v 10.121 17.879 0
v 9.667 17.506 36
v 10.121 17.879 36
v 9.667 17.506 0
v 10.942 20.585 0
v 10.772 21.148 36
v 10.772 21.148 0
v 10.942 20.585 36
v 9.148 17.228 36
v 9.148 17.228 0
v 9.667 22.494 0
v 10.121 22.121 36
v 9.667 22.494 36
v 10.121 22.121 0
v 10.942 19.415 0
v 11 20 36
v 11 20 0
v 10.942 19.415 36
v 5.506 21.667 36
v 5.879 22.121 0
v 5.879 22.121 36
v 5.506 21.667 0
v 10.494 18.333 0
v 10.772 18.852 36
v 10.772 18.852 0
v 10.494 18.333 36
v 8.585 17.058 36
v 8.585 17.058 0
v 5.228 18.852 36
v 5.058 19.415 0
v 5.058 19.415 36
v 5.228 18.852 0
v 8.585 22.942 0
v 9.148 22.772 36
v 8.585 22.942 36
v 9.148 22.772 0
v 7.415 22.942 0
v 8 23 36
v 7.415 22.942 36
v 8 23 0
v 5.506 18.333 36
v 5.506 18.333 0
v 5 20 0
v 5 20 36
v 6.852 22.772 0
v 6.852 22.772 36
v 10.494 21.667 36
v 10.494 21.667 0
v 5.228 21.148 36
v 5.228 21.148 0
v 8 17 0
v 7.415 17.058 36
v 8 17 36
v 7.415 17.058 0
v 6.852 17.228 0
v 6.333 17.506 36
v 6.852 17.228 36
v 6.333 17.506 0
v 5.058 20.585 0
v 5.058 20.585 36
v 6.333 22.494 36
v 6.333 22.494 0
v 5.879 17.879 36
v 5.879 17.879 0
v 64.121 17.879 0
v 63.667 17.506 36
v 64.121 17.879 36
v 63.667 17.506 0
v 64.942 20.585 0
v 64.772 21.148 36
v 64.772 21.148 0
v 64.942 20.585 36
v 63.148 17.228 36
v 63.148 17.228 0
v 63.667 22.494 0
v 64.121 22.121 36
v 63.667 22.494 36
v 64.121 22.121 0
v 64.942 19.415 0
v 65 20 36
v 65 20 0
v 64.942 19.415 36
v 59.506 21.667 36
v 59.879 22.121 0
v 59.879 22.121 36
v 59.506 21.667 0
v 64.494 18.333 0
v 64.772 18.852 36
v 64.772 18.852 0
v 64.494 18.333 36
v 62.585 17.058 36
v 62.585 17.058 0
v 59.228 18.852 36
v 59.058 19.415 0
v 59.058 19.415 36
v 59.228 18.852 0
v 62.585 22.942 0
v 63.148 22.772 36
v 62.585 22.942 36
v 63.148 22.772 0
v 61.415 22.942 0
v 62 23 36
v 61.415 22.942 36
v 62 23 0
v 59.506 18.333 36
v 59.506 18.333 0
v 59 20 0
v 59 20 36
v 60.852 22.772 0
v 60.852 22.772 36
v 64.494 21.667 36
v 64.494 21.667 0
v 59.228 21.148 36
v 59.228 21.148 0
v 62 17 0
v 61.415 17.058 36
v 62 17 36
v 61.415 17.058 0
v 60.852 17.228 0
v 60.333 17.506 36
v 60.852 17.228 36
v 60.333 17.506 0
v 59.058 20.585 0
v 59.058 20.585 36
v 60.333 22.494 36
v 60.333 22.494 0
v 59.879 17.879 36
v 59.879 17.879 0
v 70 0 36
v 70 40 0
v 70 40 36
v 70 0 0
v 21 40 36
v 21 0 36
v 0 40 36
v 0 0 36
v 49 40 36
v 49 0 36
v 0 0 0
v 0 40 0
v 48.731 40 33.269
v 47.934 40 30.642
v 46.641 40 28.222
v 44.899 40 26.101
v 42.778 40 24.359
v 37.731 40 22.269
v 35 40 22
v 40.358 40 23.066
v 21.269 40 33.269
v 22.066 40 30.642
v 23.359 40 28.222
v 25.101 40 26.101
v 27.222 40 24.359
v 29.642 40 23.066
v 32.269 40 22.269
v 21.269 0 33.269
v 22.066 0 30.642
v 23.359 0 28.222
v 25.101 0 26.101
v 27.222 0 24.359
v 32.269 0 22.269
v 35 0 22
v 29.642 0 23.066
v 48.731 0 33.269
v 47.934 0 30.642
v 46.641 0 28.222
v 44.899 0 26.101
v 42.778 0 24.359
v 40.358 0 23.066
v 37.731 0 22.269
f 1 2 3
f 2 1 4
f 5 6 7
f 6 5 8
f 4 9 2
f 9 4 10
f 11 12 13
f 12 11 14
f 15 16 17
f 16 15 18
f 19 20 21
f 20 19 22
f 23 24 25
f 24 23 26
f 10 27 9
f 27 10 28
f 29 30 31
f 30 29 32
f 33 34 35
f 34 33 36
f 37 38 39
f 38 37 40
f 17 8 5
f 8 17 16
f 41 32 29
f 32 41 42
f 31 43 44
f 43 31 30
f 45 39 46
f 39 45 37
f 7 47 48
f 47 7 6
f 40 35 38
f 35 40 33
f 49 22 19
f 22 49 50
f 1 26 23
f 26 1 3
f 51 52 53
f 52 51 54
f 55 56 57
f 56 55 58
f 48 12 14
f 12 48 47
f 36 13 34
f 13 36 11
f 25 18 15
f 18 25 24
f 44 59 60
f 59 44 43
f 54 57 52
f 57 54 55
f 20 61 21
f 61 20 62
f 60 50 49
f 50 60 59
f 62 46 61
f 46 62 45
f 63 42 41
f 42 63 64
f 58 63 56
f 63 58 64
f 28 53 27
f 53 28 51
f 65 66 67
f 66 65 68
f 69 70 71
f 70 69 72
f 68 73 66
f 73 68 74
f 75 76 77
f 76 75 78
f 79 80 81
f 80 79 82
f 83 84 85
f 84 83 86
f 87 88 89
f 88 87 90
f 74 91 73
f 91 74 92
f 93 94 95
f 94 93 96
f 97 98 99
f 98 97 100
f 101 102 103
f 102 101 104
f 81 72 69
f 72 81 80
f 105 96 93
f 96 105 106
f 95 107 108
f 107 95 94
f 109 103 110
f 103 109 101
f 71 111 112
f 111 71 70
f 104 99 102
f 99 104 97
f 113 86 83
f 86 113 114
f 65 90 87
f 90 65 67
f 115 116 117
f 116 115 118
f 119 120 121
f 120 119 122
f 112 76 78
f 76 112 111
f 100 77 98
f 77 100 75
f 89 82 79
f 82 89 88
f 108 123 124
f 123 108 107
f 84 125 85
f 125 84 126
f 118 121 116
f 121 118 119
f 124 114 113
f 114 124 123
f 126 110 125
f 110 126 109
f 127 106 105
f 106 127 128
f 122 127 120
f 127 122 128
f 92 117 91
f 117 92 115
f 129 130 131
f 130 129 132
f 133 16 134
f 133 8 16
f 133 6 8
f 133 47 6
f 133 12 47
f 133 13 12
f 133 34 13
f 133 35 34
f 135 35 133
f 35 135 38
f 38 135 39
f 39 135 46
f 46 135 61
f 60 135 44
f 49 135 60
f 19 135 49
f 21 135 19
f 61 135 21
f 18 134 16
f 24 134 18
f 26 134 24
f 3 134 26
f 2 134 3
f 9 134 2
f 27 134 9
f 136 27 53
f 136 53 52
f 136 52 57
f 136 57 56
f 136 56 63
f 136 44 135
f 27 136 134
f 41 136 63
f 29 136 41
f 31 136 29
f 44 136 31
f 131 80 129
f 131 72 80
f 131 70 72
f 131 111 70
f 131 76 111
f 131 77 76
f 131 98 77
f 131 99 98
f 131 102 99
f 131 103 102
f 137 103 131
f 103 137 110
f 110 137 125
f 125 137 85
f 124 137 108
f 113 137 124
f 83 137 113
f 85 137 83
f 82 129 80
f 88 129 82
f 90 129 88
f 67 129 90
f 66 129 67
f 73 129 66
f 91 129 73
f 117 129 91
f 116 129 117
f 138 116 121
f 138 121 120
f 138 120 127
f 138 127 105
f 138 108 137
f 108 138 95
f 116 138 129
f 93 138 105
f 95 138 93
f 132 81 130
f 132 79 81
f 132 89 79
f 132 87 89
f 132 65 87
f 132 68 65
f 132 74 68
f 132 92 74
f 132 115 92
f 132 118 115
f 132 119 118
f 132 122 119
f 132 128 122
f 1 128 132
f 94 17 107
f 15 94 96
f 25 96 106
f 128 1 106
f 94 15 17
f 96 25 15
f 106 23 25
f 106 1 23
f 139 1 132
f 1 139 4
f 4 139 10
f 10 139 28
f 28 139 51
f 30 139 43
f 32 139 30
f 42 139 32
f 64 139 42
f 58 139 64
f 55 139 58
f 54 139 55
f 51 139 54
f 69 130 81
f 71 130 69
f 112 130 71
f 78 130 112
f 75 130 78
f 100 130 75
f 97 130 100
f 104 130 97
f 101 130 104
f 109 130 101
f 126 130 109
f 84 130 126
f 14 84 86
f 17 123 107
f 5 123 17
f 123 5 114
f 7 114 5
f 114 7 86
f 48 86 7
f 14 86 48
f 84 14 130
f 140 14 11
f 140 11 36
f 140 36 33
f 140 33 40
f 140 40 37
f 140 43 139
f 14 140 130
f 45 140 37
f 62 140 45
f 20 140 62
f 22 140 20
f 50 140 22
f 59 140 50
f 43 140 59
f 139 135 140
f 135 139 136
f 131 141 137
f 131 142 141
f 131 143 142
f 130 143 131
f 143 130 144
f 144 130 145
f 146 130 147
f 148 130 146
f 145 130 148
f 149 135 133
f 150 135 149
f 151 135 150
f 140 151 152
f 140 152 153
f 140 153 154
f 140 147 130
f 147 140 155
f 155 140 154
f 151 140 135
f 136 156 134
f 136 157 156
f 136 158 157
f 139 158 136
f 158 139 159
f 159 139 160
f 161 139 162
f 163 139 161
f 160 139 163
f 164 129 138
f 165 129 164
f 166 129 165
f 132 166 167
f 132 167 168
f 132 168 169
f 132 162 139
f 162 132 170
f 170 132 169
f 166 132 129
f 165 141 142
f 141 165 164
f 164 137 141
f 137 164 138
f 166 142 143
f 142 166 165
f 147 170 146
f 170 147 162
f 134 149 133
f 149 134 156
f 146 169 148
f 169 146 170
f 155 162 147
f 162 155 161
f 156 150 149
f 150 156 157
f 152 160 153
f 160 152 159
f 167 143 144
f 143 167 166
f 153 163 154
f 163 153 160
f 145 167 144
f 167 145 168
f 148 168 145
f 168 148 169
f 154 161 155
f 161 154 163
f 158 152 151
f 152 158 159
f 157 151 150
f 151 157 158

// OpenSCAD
$fn = 32;

// ----------------------------------------------------------------------
// Saddle clamp: plain shaft clamp
// ----------------------------------------------------------------------

// --- parameters (mm) ---
blk_l = 70;               // block length, X
blk_w = 40;               // block width, Y
blk_h = 36;               // block height
clamp_r = 14;             // shaft groove radius
hole_r = 3;               // bolt hole radius
hole_m = 8;               // bolt hole margin from the ends

saw_depth = clamp_r + 3;  // saw kerf depth

difference() {
  cube([blk_l, blk_w, blk_h]);
  translate([blk_l / 2, -1, blk_h])
    rotate([-90, 0, 0])
      cylinder(h = blk_w + 2, r = clamp_r);
  for (sx = [0, 1])
    translate([sx ? blk_l - hole_m : hole_m, blk_w / 2, -1])
      cylinder(r = hole_r, h = blk_h + 2);
}
